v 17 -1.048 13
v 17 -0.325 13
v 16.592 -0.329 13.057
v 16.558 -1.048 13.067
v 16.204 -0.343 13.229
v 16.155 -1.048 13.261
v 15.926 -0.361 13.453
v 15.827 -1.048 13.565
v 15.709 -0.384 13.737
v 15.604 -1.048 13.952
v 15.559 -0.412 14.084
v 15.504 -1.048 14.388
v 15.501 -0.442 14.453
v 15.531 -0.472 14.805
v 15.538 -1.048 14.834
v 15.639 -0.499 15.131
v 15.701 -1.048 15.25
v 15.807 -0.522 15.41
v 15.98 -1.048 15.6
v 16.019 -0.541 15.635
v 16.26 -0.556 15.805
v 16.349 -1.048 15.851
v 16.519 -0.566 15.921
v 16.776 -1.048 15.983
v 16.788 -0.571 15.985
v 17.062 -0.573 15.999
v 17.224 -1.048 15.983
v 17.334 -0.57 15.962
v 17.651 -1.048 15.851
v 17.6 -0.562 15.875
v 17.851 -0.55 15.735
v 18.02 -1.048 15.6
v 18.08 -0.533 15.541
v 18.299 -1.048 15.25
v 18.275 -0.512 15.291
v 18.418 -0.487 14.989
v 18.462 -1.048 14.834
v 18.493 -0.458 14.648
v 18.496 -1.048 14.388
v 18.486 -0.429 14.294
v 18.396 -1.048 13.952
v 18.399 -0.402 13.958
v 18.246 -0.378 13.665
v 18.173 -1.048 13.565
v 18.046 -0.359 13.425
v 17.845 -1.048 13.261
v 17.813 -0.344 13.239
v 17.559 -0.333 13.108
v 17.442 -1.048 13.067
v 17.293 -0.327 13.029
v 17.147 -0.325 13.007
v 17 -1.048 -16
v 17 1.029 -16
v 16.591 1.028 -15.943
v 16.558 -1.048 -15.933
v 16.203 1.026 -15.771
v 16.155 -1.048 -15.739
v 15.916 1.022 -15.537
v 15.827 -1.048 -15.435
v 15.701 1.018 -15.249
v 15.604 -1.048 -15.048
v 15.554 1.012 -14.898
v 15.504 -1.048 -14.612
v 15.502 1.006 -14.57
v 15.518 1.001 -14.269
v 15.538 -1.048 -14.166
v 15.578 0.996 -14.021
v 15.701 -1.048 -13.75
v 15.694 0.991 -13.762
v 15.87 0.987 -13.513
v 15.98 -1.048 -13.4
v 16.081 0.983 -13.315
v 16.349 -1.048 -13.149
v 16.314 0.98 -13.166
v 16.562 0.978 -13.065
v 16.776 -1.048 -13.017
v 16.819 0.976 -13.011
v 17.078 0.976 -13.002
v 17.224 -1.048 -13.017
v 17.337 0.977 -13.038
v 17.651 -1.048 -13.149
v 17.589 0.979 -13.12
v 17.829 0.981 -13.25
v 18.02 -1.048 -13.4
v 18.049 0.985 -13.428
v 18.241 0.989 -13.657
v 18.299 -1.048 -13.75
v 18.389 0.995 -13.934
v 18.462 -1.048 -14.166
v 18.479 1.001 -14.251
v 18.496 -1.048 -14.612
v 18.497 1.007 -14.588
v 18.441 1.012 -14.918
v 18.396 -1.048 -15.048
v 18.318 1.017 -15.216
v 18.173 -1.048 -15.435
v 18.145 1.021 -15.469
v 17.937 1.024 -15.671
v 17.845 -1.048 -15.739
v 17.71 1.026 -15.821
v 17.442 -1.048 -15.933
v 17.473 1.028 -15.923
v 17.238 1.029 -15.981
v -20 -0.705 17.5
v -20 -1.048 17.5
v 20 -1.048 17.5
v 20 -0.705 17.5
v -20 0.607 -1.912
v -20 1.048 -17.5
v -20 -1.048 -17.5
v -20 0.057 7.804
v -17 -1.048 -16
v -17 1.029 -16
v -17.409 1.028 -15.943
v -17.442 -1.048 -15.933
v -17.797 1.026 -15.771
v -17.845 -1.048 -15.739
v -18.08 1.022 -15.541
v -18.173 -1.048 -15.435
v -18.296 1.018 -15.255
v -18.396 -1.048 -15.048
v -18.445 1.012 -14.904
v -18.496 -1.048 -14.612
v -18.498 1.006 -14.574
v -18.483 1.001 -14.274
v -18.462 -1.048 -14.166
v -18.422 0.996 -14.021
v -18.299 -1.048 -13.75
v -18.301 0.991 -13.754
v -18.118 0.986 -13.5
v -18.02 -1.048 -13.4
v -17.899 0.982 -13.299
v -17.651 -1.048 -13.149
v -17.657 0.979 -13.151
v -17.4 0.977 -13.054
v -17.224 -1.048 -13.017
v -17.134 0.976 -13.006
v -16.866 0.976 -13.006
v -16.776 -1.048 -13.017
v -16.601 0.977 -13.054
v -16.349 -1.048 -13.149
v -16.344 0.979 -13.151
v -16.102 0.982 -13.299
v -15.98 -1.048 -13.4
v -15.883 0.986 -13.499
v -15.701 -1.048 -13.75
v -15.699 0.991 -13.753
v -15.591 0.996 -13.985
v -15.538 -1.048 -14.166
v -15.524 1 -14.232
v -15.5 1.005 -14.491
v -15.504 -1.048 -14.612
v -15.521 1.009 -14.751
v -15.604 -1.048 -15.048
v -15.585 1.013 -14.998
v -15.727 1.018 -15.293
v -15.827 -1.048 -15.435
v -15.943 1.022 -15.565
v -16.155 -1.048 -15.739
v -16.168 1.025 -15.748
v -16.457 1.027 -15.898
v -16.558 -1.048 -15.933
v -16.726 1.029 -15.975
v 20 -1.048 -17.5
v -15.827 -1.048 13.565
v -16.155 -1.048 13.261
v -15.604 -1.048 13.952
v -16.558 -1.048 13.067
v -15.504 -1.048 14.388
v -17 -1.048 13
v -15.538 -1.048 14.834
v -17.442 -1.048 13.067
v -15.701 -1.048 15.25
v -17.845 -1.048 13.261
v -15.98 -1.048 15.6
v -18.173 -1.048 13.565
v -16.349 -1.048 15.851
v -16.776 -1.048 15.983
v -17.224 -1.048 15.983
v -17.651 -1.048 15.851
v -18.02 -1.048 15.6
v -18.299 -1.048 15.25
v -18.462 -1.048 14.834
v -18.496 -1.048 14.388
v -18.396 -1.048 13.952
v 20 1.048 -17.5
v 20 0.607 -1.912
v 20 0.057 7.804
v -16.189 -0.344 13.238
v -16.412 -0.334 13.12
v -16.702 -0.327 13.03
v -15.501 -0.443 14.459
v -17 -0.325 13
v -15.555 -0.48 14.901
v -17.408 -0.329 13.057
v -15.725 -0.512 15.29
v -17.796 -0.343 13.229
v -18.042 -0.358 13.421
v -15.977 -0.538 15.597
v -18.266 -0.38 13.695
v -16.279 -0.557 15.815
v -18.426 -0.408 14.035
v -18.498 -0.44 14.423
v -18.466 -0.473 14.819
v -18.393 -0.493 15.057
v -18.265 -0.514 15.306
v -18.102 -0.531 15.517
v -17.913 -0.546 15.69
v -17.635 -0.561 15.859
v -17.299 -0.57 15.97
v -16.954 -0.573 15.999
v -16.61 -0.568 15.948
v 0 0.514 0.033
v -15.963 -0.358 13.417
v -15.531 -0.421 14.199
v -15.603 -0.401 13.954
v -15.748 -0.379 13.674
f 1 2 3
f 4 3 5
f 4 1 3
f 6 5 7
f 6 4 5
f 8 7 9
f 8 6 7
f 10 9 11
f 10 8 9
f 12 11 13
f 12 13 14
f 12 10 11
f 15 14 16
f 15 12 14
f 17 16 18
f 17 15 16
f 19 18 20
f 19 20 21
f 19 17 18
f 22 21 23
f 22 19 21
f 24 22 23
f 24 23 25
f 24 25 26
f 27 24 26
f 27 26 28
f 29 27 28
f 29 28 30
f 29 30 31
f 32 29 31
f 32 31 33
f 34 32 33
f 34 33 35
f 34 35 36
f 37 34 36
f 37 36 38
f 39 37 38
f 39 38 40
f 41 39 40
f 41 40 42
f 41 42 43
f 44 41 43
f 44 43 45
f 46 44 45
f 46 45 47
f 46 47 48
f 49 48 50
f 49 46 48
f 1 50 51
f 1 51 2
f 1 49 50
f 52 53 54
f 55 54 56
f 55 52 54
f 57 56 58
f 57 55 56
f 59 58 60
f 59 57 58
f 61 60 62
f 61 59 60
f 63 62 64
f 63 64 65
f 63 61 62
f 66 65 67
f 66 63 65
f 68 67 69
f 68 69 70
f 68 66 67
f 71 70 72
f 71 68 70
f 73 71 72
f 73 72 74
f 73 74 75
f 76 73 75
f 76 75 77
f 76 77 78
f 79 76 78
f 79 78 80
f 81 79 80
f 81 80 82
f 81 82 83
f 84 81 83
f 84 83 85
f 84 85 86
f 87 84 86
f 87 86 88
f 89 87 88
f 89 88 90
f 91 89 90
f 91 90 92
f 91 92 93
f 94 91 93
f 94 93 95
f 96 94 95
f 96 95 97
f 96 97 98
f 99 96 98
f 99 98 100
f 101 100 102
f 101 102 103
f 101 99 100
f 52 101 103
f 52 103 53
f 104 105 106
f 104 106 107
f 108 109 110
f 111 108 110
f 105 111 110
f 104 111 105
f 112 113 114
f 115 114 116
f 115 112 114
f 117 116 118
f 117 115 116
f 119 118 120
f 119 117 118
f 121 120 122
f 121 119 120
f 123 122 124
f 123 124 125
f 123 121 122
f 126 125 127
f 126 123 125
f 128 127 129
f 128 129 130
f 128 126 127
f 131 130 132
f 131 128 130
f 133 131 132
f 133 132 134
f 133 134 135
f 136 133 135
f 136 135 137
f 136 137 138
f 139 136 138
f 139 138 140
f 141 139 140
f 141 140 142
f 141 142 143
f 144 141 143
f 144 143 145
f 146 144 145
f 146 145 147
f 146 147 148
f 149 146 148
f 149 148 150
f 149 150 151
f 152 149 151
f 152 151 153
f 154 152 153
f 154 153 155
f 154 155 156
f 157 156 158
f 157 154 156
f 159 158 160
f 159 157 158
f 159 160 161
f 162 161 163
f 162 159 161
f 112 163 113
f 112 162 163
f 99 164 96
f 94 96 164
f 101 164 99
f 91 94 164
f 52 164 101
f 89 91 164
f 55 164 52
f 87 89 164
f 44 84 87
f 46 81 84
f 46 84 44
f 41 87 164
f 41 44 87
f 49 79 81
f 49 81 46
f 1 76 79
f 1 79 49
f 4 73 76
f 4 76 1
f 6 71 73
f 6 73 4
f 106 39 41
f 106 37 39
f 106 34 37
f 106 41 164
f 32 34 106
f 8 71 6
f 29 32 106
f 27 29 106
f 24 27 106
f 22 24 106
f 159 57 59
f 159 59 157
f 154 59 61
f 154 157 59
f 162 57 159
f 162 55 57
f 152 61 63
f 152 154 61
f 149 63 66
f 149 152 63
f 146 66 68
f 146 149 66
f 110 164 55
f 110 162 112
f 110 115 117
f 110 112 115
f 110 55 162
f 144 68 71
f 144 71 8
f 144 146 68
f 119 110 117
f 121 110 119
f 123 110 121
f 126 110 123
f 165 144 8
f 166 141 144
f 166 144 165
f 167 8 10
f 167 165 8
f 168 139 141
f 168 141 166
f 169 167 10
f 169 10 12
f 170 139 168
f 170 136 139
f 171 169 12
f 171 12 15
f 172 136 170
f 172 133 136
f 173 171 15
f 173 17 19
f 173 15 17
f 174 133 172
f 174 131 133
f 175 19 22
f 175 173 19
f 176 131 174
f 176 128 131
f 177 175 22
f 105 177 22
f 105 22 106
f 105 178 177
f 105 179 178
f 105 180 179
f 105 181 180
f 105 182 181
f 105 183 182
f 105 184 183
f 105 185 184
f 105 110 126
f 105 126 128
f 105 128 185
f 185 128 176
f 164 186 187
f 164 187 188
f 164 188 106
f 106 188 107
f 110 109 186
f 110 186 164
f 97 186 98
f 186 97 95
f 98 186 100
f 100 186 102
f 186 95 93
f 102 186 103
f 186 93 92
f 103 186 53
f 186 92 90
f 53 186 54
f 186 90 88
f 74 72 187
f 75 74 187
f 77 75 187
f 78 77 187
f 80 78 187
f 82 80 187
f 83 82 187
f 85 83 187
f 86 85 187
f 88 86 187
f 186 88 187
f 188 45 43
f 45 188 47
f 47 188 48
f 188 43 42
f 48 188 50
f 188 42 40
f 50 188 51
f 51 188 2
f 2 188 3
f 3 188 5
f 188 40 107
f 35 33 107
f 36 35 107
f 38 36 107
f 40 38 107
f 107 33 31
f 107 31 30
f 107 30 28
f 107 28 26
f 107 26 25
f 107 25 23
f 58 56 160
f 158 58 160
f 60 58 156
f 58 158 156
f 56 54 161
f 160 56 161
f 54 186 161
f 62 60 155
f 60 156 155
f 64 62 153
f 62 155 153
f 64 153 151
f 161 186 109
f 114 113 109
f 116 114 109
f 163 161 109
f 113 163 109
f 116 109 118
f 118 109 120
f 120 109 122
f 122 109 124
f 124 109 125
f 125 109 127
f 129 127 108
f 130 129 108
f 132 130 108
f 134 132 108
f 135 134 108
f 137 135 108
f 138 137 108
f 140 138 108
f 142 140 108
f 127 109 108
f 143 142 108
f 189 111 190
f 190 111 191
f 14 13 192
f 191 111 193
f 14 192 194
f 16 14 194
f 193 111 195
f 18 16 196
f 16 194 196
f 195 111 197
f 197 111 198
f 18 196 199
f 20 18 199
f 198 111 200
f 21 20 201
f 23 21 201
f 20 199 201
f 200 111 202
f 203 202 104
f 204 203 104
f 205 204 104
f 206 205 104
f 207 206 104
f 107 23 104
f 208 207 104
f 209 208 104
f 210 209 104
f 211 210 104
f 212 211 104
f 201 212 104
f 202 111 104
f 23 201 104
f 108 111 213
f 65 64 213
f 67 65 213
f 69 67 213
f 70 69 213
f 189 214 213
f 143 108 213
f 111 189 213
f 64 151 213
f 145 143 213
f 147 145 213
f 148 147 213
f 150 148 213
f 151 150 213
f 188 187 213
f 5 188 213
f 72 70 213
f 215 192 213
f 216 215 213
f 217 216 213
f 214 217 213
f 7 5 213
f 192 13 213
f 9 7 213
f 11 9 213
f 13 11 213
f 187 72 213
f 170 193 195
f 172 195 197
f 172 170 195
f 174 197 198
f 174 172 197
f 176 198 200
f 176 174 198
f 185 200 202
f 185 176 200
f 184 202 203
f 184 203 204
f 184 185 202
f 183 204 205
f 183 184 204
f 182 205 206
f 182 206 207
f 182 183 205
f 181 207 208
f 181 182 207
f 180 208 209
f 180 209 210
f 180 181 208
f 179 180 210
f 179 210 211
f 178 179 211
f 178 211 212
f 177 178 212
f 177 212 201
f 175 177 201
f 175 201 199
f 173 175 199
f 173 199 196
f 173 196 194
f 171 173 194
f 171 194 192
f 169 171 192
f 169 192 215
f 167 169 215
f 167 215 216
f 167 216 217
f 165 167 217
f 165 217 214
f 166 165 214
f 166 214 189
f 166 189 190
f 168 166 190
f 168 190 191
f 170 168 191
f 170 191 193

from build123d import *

# Parameters (mm, degrees)
EXTRUDE_1_DEPTH          = 20
EXTRUDE_1_DEPTH_BACK     = 20
CUT_EXTRUDE_1_DEPTH      = 2
CUT_EXTRUDE_1_DEPTH_BACK = 2
SKETCH_1_R               = 1.5


with BuildPart() as part:
    # Эскиз2 → Бобышка-Вытянуть1 (new, two sides: drawn at the far end of the back side and taken through both)
    with BuildSketch(Plane(origin=(0, 0, 0), x_dir=(0, 0, -1), z_dir=(1, 0, 0)).offset(-EXTRUDE_1_DEPTH_BACK)):
        with BuildLine():
            Line((17.5, -1.047727657), (-17.5, -1.047727657))
            Line((-17.5, -1.047727657), (-17.5, -0.704509614))
            add(Edge.make_bspline(
                [(17.5, 1.047727657), (-0.065994776, 0.856176588), (-17.5, -0.704509614)],
                knots=[0, 0, 0, 0.42600317, 0.42600317, 0.42600317], degree=2))
            Line((17.5, 1.047727657), (17.5, -1.047727657))
        make_face()
    extrude(amount=EXTRUDE_1_DEPTH + EXTRUDE_1_DEPTH_BACK)

    # Эскиз1 → Вырез-Вытянуть1 (cut, two sides: drawn at the far end of the back side and taken through both)
    with BuildSketch(Plane(origin=(0, 0, 0), x_dir=(1, 0, 0), z_dir=(0, 1, 0)).offset(-CUT_EXTRUDE_1_DEPTH_BACK)):
        with Locations((-17, 14.5)):
            Circle(SKETCH_1_R)
        with Locations((17, 14.5)):
            Circle(SKETCH_1_R)
        with Locations((-17, -14.5)):
            Circle(SKETCH_1_R)
        with Locations((17, -14.5)):
            Circle(SKETCH_1_R)
    extrude(amount=CUT_EXTRUDE_1_DEPTH + CUT_EXTRUDE_1_DEPTH_BACK, mode=Mode.SUBTRACT)


solid = part.part
